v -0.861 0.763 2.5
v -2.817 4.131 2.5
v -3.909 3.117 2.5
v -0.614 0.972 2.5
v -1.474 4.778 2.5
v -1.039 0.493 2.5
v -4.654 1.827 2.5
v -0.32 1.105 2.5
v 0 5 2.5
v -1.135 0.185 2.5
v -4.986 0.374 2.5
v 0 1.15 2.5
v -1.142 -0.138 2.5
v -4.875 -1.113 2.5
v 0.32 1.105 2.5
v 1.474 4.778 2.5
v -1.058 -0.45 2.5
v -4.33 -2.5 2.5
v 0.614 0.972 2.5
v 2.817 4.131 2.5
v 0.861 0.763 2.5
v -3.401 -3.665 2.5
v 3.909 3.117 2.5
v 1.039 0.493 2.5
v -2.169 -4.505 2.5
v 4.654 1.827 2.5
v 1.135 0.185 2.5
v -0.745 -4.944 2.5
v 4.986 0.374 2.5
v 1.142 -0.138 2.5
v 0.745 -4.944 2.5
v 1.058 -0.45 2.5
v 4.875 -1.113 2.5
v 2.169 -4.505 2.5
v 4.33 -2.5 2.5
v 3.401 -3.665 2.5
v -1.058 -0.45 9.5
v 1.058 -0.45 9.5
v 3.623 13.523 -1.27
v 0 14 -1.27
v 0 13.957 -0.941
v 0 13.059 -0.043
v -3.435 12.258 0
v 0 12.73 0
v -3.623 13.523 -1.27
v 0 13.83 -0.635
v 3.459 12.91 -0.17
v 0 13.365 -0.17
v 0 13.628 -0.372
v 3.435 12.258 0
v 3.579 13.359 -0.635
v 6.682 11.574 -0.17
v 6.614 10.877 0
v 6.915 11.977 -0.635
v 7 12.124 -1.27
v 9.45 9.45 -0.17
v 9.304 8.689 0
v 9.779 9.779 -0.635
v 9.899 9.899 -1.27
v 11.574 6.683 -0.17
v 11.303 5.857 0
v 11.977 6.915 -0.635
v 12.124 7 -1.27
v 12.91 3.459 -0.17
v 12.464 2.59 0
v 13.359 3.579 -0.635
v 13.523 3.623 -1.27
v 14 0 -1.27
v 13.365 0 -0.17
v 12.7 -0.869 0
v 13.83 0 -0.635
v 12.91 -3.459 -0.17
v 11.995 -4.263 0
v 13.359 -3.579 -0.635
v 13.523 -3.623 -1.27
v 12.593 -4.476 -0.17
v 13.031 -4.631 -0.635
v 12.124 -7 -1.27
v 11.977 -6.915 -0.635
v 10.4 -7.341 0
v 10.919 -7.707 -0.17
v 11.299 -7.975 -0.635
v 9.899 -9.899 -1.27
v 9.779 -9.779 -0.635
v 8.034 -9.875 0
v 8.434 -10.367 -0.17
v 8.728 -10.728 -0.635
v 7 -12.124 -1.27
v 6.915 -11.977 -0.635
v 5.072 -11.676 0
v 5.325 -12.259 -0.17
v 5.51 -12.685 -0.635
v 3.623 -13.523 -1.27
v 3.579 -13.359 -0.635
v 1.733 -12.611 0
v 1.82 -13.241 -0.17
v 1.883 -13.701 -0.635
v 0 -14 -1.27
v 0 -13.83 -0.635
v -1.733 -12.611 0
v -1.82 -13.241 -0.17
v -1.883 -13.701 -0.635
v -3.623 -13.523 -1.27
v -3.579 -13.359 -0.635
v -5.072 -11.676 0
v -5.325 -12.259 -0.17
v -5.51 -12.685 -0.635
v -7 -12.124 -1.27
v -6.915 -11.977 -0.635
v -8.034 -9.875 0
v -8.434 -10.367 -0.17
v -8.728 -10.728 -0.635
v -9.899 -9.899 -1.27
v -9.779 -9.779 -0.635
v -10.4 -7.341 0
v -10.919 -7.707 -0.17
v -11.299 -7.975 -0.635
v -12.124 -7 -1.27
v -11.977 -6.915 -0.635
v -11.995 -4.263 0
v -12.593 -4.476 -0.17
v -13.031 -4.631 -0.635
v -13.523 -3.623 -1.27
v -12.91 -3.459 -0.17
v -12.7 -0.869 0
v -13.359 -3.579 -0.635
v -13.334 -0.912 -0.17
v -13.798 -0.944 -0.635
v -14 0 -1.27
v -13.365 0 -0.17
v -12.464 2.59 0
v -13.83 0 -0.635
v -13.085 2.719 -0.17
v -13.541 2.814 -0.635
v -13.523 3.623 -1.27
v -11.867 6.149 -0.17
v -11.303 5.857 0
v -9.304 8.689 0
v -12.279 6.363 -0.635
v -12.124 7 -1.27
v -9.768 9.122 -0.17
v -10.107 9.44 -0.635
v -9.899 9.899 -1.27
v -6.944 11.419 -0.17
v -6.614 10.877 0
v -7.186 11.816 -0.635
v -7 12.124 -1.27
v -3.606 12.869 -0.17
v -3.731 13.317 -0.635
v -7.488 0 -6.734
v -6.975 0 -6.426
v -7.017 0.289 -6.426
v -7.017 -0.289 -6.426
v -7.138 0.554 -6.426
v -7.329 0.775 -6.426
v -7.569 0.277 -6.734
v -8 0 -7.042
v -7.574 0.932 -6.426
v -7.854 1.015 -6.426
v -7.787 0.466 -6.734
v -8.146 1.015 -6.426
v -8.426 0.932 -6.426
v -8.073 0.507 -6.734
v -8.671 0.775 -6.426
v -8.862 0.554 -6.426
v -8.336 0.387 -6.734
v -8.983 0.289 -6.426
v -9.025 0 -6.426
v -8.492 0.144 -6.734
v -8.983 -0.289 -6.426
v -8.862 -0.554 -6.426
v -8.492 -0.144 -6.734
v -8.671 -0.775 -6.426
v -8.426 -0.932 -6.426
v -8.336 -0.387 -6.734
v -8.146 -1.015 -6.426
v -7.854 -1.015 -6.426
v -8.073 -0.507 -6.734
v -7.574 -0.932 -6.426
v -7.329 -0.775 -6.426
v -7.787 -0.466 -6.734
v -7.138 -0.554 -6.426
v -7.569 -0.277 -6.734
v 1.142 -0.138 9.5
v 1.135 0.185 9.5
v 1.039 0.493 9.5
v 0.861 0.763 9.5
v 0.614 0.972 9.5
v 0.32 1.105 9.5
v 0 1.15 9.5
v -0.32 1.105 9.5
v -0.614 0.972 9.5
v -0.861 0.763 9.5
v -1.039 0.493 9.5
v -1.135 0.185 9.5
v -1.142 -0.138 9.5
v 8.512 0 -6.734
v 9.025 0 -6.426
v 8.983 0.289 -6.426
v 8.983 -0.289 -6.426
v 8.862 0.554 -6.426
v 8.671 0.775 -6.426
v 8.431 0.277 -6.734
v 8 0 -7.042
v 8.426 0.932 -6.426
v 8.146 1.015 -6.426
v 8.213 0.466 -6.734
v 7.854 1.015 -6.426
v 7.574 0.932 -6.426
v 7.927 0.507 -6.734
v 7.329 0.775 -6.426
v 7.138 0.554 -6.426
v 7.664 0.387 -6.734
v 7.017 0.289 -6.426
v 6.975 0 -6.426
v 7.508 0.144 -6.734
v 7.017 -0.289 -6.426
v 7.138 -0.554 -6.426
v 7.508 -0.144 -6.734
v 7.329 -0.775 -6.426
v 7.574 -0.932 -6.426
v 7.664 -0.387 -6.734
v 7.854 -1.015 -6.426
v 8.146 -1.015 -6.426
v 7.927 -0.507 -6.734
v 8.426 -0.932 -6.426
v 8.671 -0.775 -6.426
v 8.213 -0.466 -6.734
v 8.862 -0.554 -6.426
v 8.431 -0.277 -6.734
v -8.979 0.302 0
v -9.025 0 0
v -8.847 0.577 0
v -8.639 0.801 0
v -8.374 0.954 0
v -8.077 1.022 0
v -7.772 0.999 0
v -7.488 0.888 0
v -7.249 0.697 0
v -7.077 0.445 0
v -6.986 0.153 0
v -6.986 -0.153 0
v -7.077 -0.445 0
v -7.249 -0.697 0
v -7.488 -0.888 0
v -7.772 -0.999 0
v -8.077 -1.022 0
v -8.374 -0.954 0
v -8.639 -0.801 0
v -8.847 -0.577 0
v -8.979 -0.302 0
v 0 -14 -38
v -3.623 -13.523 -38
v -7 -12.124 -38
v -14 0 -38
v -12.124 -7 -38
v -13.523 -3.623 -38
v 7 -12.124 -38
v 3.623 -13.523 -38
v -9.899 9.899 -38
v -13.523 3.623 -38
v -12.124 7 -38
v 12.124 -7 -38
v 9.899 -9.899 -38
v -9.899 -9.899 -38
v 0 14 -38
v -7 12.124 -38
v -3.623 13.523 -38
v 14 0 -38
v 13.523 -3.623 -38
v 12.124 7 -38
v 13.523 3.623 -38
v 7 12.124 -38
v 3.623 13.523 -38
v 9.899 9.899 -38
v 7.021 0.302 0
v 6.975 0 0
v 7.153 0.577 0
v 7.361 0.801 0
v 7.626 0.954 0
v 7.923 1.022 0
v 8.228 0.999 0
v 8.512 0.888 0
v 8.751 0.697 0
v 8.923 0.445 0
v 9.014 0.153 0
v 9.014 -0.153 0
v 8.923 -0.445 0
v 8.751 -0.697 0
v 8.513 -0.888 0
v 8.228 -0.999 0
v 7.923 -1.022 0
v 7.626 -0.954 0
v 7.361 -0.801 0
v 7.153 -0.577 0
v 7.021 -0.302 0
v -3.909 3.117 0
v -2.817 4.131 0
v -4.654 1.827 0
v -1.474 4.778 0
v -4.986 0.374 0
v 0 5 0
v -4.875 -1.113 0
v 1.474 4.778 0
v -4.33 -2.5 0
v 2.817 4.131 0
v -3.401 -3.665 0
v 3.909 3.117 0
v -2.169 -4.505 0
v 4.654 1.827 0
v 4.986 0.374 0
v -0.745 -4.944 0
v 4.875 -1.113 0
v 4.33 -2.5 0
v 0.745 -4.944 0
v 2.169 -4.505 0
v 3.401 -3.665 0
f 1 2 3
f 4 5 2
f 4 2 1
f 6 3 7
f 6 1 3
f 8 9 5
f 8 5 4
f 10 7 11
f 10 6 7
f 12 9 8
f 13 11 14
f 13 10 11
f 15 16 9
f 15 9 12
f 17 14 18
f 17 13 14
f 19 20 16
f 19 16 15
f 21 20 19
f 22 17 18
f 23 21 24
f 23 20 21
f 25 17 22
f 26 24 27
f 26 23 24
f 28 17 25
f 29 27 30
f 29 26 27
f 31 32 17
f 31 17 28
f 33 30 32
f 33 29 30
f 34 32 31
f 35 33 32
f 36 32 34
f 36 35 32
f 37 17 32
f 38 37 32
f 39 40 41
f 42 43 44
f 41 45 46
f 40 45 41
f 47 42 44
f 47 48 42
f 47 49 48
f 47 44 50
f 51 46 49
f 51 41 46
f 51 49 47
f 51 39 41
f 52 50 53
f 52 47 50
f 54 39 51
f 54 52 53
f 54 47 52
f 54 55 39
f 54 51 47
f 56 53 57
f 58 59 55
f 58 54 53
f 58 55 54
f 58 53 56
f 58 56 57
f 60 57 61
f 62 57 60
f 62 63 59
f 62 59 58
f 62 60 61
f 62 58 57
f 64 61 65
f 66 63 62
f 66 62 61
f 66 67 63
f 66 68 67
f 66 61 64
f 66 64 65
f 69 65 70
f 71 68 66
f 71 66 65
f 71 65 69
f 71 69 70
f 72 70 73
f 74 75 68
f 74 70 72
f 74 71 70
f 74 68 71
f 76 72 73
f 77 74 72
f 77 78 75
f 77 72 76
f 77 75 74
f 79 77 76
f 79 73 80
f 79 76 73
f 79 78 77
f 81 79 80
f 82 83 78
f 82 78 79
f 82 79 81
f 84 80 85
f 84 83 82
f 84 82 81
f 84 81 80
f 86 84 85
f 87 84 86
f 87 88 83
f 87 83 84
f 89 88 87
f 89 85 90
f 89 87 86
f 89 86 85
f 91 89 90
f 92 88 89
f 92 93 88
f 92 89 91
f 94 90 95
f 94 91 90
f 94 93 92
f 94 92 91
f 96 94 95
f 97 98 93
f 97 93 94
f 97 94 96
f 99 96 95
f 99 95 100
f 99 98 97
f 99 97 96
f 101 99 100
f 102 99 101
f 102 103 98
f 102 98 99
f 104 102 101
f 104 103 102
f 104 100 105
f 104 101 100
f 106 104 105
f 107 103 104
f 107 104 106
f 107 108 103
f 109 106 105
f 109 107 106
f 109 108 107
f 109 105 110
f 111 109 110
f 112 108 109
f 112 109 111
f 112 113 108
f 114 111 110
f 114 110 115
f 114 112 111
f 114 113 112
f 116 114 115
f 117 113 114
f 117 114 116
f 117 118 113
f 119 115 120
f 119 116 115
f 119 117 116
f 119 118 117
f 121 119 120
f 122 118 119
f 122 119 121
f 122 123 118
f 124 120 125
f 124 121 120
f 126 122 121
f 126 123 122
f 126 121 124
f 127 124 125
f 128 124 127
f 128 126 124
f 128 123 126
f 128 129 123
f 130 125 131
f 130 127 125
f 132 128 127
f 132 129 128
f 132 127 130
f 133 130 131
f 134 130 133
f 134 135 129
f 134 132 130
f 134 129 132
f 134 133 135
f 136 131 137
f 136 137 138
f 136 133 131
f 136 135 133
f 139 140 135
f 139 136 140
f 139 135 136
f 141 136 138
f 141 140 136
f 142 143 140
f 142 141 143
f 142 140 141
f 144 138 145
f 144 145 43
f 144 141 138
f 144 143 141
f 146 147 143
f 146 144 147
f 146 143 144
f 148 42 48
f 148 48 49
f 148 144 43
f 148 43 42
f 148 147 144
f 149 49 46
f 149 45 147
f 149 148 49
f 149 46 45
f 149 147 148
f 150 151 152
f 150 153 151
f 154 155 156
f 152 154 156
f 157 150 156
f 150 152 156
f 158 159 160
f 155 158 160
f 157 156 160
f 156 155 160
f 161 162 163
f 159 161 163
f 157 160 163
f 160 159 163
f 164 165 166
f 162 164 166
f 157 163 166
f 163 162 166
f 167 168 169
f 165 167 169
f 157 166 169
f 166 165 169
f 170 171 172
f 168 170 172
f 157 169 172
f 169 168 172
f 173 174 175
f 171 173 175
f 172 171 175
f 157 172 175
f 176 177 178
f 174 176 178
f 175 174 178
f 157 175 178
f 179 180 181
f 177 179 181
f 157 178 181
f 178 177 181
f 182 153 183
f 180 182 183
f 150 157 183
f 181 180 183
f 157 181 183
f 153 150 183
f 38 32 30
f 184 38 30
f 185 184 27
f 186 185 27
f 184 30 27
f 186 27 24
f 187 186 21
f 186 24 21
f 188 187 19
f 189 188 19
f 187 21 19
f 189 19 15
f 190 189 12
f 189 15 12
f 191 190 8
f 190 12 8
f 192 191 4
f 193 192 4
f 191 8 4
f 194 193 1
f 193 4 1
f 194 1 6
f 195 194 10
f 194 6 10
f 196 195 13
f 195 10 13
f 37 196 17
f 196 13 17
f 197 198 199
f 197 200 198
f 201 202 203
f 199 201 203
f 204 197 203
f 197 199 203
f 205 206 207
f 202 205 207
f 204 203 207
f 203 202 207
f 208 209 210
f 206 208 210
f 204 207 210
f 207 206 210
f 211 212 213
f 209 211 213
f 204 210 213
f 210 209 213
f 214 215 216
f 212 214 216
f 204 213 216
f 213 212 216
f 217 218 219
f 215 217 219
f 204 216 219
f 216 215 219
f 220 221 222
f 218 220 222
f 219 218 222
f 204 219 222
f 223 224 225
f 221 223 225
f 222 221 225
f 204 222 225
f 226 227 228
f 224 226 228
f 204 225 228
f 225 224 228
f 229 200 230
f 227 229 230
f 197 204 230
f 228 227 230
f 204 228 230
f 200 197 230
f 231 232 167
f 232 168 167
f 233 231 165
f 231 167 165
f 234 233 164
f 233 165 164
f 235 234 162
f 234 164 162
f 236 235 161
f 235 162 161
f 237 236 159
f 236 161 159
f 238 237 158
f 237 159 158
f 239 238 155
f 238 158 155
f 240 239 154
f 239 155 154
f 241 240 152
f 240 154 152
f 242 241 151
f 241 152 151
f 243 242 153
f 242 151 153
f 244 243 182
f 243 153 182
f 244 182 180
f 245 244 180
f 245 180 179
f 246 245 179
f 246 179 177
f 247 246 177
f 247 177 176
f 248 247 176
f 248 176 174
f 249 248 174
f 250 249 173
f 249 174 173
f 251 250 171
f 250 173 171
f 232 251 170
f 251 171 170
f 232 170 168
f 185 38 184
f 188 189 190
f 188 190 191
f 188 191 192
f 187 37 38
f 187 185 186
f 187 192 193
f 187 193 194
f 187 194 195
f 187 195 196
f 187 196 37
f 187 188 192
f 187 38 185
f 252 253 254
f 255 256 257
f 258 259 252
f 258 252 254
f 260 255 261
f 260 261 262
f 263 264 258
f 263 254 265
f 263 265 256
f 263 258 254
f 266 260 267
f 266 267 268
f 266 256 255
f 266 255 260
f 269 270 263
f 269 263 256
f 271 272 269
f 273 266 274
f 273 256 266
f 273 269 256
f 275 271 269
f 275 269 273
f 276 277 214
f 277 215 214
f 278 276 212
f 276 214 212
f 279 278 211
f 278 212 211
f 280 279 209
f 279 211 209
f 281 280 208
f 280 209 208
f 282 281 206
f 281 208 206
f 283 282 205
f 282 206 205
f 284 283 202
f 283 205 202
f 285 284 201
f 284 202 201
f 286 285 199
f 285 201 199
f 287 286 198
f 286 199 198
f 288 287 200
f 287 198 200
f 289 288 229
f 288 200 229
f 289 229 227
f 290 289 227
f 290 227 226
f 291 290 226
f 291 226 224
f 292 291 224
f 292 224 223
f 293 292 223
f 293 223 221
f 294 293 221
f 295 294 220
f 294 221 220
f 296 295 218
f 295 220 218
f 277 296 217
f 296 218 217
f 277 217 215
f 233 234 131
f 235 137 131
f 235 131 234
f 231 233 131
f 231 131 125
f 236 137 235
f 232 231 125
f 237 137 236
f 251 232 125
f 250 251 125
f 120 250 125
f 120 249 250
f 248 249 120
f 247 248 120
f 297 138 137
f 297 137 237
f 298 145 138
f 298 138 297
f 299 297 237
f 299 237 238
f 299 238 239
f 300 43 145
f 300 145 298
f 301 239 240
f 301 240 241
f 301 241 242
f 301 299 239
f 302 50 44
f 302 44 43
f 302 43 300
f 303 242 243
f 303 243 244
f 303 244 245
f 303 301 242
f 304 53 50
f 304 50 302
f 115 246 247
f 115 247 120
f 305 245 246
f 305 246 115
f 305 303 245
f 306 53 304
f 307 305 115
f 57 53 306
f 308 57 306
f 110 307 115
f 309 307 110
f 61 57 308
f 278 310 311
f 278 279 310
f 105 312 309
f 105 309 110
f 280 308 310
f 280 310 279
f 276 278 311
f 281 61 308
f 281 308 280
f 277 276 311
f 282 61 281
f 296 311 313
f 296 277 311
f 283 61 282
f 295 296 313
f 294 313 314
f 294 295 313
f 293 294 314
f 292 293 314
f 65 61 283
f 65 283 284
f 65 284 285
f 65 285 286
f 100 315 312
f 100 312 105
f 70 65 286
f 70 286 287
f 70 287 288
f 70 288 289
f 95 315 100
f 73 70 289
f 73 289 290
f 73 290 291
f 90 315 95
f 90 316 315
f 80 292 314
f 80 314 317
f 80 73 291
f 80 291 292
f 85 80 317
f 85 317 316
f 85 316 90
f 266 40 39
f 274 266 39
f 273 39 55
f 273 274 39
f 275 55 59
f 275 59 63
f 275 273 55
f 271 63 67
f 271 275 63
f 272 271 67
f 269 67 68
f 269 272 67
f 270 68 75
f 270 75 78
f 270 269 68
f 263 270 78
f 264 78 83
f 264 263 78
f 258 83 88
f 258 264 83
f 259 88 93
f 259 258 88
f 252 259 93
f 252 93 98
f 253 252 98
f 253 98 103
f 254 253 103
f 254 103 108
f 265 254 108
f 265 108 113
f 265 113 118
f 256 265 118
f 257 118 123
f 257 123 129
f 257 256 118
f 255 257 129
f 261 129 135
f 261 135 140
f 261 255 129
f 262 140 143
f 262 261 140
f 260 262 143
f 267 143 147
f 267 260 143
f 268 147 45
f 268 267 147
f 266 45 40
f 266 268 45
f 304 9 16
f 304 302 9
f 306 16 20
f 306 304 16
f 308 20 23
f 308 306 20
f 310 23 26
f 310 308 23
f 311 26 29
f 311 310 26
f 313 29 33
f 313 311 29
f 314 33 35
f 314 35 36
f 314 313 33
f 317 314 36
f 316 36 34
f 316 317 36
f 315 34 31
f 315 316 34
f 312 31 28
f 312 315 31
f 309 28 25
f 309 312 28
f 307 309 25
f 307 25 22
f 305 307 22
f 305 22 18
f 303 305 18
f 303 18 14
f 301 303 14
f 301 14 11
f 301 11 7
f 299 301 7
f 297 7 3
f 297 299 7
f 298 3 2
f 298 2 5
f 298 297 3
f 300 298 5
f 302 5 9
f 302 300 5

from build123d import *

# Parameters (mm, degrees)
BOSS_EXTRUDE1_DEPTH          = 7
M2_5X0_45_TAPPED_HOLE1_D     = 2.05
M2_5X0_45_TAPPED_HOLE1_DEPTH = 6.4262
M2_5X0_45_TAPPED_HOLE1_TIP   = 0.615882135
FILLET1_R                    = 1.27


with BuildPart() as part:
    # Sketch1 → Revolve1 (revolve)
    with BuildSketch(Plane(origin=(0, 0, 0), x_dir=(0, 0, -1), z_dir=(1, 0, 0))):
        Polygon((-2.5, 0), (-2.5, 5), (0, 5), (0, 14), (38, 14), (38, 0), align=None)
    revolve(axis=Axis((0, 0, 0), (0, 0, -1)))

    # Sketch2 → Boss-Extrude1 (add)
    with BuildSketch(Plane.XY.offset(2.5)):
        with BuildLine():
            Line((-1.058300524, -0.45), (1.058300524, -0.45))
            ThreePointArc((1.058300524, -0.45), (0, 1.15), (-1.058300524, -0.45))
        make_face()
    extrude(amount=BOSS_EXTRUDE1_DEPTH)

    # M2.5x0.45 Tapped Hole1
    with Locations(Plane.XY):
        with Locations((8, 0), (-8, 0)):
            Hole(M2_5X0_45_TAPPED_HOLE1_D / 2, depth=M2_5X0_45_TAPPED_HOLE1_DEPTH)
            with Locations((0, 0, -(M2_5X0_45_TAPPED_HOLE1_DEPTH + M2_5X0_45_TAPPED_HOLE1_TIP / 2))):  # 118° drill point
                Cone(0, M2_5X0_45_TAPPED_HOLE1_D / 2, M2_5X0_45_TAPPED_HOLE1_TIP, mode=Mode.SUBTRACT)

    # Fillet1
    fillet1_edges = [part.edges().sort_by_distance(p)[0] for p in [
        (0, -14, 0),
    ]]
    fillet(fillet1_edges, radius=FILLET1_R)


solid = part.part
